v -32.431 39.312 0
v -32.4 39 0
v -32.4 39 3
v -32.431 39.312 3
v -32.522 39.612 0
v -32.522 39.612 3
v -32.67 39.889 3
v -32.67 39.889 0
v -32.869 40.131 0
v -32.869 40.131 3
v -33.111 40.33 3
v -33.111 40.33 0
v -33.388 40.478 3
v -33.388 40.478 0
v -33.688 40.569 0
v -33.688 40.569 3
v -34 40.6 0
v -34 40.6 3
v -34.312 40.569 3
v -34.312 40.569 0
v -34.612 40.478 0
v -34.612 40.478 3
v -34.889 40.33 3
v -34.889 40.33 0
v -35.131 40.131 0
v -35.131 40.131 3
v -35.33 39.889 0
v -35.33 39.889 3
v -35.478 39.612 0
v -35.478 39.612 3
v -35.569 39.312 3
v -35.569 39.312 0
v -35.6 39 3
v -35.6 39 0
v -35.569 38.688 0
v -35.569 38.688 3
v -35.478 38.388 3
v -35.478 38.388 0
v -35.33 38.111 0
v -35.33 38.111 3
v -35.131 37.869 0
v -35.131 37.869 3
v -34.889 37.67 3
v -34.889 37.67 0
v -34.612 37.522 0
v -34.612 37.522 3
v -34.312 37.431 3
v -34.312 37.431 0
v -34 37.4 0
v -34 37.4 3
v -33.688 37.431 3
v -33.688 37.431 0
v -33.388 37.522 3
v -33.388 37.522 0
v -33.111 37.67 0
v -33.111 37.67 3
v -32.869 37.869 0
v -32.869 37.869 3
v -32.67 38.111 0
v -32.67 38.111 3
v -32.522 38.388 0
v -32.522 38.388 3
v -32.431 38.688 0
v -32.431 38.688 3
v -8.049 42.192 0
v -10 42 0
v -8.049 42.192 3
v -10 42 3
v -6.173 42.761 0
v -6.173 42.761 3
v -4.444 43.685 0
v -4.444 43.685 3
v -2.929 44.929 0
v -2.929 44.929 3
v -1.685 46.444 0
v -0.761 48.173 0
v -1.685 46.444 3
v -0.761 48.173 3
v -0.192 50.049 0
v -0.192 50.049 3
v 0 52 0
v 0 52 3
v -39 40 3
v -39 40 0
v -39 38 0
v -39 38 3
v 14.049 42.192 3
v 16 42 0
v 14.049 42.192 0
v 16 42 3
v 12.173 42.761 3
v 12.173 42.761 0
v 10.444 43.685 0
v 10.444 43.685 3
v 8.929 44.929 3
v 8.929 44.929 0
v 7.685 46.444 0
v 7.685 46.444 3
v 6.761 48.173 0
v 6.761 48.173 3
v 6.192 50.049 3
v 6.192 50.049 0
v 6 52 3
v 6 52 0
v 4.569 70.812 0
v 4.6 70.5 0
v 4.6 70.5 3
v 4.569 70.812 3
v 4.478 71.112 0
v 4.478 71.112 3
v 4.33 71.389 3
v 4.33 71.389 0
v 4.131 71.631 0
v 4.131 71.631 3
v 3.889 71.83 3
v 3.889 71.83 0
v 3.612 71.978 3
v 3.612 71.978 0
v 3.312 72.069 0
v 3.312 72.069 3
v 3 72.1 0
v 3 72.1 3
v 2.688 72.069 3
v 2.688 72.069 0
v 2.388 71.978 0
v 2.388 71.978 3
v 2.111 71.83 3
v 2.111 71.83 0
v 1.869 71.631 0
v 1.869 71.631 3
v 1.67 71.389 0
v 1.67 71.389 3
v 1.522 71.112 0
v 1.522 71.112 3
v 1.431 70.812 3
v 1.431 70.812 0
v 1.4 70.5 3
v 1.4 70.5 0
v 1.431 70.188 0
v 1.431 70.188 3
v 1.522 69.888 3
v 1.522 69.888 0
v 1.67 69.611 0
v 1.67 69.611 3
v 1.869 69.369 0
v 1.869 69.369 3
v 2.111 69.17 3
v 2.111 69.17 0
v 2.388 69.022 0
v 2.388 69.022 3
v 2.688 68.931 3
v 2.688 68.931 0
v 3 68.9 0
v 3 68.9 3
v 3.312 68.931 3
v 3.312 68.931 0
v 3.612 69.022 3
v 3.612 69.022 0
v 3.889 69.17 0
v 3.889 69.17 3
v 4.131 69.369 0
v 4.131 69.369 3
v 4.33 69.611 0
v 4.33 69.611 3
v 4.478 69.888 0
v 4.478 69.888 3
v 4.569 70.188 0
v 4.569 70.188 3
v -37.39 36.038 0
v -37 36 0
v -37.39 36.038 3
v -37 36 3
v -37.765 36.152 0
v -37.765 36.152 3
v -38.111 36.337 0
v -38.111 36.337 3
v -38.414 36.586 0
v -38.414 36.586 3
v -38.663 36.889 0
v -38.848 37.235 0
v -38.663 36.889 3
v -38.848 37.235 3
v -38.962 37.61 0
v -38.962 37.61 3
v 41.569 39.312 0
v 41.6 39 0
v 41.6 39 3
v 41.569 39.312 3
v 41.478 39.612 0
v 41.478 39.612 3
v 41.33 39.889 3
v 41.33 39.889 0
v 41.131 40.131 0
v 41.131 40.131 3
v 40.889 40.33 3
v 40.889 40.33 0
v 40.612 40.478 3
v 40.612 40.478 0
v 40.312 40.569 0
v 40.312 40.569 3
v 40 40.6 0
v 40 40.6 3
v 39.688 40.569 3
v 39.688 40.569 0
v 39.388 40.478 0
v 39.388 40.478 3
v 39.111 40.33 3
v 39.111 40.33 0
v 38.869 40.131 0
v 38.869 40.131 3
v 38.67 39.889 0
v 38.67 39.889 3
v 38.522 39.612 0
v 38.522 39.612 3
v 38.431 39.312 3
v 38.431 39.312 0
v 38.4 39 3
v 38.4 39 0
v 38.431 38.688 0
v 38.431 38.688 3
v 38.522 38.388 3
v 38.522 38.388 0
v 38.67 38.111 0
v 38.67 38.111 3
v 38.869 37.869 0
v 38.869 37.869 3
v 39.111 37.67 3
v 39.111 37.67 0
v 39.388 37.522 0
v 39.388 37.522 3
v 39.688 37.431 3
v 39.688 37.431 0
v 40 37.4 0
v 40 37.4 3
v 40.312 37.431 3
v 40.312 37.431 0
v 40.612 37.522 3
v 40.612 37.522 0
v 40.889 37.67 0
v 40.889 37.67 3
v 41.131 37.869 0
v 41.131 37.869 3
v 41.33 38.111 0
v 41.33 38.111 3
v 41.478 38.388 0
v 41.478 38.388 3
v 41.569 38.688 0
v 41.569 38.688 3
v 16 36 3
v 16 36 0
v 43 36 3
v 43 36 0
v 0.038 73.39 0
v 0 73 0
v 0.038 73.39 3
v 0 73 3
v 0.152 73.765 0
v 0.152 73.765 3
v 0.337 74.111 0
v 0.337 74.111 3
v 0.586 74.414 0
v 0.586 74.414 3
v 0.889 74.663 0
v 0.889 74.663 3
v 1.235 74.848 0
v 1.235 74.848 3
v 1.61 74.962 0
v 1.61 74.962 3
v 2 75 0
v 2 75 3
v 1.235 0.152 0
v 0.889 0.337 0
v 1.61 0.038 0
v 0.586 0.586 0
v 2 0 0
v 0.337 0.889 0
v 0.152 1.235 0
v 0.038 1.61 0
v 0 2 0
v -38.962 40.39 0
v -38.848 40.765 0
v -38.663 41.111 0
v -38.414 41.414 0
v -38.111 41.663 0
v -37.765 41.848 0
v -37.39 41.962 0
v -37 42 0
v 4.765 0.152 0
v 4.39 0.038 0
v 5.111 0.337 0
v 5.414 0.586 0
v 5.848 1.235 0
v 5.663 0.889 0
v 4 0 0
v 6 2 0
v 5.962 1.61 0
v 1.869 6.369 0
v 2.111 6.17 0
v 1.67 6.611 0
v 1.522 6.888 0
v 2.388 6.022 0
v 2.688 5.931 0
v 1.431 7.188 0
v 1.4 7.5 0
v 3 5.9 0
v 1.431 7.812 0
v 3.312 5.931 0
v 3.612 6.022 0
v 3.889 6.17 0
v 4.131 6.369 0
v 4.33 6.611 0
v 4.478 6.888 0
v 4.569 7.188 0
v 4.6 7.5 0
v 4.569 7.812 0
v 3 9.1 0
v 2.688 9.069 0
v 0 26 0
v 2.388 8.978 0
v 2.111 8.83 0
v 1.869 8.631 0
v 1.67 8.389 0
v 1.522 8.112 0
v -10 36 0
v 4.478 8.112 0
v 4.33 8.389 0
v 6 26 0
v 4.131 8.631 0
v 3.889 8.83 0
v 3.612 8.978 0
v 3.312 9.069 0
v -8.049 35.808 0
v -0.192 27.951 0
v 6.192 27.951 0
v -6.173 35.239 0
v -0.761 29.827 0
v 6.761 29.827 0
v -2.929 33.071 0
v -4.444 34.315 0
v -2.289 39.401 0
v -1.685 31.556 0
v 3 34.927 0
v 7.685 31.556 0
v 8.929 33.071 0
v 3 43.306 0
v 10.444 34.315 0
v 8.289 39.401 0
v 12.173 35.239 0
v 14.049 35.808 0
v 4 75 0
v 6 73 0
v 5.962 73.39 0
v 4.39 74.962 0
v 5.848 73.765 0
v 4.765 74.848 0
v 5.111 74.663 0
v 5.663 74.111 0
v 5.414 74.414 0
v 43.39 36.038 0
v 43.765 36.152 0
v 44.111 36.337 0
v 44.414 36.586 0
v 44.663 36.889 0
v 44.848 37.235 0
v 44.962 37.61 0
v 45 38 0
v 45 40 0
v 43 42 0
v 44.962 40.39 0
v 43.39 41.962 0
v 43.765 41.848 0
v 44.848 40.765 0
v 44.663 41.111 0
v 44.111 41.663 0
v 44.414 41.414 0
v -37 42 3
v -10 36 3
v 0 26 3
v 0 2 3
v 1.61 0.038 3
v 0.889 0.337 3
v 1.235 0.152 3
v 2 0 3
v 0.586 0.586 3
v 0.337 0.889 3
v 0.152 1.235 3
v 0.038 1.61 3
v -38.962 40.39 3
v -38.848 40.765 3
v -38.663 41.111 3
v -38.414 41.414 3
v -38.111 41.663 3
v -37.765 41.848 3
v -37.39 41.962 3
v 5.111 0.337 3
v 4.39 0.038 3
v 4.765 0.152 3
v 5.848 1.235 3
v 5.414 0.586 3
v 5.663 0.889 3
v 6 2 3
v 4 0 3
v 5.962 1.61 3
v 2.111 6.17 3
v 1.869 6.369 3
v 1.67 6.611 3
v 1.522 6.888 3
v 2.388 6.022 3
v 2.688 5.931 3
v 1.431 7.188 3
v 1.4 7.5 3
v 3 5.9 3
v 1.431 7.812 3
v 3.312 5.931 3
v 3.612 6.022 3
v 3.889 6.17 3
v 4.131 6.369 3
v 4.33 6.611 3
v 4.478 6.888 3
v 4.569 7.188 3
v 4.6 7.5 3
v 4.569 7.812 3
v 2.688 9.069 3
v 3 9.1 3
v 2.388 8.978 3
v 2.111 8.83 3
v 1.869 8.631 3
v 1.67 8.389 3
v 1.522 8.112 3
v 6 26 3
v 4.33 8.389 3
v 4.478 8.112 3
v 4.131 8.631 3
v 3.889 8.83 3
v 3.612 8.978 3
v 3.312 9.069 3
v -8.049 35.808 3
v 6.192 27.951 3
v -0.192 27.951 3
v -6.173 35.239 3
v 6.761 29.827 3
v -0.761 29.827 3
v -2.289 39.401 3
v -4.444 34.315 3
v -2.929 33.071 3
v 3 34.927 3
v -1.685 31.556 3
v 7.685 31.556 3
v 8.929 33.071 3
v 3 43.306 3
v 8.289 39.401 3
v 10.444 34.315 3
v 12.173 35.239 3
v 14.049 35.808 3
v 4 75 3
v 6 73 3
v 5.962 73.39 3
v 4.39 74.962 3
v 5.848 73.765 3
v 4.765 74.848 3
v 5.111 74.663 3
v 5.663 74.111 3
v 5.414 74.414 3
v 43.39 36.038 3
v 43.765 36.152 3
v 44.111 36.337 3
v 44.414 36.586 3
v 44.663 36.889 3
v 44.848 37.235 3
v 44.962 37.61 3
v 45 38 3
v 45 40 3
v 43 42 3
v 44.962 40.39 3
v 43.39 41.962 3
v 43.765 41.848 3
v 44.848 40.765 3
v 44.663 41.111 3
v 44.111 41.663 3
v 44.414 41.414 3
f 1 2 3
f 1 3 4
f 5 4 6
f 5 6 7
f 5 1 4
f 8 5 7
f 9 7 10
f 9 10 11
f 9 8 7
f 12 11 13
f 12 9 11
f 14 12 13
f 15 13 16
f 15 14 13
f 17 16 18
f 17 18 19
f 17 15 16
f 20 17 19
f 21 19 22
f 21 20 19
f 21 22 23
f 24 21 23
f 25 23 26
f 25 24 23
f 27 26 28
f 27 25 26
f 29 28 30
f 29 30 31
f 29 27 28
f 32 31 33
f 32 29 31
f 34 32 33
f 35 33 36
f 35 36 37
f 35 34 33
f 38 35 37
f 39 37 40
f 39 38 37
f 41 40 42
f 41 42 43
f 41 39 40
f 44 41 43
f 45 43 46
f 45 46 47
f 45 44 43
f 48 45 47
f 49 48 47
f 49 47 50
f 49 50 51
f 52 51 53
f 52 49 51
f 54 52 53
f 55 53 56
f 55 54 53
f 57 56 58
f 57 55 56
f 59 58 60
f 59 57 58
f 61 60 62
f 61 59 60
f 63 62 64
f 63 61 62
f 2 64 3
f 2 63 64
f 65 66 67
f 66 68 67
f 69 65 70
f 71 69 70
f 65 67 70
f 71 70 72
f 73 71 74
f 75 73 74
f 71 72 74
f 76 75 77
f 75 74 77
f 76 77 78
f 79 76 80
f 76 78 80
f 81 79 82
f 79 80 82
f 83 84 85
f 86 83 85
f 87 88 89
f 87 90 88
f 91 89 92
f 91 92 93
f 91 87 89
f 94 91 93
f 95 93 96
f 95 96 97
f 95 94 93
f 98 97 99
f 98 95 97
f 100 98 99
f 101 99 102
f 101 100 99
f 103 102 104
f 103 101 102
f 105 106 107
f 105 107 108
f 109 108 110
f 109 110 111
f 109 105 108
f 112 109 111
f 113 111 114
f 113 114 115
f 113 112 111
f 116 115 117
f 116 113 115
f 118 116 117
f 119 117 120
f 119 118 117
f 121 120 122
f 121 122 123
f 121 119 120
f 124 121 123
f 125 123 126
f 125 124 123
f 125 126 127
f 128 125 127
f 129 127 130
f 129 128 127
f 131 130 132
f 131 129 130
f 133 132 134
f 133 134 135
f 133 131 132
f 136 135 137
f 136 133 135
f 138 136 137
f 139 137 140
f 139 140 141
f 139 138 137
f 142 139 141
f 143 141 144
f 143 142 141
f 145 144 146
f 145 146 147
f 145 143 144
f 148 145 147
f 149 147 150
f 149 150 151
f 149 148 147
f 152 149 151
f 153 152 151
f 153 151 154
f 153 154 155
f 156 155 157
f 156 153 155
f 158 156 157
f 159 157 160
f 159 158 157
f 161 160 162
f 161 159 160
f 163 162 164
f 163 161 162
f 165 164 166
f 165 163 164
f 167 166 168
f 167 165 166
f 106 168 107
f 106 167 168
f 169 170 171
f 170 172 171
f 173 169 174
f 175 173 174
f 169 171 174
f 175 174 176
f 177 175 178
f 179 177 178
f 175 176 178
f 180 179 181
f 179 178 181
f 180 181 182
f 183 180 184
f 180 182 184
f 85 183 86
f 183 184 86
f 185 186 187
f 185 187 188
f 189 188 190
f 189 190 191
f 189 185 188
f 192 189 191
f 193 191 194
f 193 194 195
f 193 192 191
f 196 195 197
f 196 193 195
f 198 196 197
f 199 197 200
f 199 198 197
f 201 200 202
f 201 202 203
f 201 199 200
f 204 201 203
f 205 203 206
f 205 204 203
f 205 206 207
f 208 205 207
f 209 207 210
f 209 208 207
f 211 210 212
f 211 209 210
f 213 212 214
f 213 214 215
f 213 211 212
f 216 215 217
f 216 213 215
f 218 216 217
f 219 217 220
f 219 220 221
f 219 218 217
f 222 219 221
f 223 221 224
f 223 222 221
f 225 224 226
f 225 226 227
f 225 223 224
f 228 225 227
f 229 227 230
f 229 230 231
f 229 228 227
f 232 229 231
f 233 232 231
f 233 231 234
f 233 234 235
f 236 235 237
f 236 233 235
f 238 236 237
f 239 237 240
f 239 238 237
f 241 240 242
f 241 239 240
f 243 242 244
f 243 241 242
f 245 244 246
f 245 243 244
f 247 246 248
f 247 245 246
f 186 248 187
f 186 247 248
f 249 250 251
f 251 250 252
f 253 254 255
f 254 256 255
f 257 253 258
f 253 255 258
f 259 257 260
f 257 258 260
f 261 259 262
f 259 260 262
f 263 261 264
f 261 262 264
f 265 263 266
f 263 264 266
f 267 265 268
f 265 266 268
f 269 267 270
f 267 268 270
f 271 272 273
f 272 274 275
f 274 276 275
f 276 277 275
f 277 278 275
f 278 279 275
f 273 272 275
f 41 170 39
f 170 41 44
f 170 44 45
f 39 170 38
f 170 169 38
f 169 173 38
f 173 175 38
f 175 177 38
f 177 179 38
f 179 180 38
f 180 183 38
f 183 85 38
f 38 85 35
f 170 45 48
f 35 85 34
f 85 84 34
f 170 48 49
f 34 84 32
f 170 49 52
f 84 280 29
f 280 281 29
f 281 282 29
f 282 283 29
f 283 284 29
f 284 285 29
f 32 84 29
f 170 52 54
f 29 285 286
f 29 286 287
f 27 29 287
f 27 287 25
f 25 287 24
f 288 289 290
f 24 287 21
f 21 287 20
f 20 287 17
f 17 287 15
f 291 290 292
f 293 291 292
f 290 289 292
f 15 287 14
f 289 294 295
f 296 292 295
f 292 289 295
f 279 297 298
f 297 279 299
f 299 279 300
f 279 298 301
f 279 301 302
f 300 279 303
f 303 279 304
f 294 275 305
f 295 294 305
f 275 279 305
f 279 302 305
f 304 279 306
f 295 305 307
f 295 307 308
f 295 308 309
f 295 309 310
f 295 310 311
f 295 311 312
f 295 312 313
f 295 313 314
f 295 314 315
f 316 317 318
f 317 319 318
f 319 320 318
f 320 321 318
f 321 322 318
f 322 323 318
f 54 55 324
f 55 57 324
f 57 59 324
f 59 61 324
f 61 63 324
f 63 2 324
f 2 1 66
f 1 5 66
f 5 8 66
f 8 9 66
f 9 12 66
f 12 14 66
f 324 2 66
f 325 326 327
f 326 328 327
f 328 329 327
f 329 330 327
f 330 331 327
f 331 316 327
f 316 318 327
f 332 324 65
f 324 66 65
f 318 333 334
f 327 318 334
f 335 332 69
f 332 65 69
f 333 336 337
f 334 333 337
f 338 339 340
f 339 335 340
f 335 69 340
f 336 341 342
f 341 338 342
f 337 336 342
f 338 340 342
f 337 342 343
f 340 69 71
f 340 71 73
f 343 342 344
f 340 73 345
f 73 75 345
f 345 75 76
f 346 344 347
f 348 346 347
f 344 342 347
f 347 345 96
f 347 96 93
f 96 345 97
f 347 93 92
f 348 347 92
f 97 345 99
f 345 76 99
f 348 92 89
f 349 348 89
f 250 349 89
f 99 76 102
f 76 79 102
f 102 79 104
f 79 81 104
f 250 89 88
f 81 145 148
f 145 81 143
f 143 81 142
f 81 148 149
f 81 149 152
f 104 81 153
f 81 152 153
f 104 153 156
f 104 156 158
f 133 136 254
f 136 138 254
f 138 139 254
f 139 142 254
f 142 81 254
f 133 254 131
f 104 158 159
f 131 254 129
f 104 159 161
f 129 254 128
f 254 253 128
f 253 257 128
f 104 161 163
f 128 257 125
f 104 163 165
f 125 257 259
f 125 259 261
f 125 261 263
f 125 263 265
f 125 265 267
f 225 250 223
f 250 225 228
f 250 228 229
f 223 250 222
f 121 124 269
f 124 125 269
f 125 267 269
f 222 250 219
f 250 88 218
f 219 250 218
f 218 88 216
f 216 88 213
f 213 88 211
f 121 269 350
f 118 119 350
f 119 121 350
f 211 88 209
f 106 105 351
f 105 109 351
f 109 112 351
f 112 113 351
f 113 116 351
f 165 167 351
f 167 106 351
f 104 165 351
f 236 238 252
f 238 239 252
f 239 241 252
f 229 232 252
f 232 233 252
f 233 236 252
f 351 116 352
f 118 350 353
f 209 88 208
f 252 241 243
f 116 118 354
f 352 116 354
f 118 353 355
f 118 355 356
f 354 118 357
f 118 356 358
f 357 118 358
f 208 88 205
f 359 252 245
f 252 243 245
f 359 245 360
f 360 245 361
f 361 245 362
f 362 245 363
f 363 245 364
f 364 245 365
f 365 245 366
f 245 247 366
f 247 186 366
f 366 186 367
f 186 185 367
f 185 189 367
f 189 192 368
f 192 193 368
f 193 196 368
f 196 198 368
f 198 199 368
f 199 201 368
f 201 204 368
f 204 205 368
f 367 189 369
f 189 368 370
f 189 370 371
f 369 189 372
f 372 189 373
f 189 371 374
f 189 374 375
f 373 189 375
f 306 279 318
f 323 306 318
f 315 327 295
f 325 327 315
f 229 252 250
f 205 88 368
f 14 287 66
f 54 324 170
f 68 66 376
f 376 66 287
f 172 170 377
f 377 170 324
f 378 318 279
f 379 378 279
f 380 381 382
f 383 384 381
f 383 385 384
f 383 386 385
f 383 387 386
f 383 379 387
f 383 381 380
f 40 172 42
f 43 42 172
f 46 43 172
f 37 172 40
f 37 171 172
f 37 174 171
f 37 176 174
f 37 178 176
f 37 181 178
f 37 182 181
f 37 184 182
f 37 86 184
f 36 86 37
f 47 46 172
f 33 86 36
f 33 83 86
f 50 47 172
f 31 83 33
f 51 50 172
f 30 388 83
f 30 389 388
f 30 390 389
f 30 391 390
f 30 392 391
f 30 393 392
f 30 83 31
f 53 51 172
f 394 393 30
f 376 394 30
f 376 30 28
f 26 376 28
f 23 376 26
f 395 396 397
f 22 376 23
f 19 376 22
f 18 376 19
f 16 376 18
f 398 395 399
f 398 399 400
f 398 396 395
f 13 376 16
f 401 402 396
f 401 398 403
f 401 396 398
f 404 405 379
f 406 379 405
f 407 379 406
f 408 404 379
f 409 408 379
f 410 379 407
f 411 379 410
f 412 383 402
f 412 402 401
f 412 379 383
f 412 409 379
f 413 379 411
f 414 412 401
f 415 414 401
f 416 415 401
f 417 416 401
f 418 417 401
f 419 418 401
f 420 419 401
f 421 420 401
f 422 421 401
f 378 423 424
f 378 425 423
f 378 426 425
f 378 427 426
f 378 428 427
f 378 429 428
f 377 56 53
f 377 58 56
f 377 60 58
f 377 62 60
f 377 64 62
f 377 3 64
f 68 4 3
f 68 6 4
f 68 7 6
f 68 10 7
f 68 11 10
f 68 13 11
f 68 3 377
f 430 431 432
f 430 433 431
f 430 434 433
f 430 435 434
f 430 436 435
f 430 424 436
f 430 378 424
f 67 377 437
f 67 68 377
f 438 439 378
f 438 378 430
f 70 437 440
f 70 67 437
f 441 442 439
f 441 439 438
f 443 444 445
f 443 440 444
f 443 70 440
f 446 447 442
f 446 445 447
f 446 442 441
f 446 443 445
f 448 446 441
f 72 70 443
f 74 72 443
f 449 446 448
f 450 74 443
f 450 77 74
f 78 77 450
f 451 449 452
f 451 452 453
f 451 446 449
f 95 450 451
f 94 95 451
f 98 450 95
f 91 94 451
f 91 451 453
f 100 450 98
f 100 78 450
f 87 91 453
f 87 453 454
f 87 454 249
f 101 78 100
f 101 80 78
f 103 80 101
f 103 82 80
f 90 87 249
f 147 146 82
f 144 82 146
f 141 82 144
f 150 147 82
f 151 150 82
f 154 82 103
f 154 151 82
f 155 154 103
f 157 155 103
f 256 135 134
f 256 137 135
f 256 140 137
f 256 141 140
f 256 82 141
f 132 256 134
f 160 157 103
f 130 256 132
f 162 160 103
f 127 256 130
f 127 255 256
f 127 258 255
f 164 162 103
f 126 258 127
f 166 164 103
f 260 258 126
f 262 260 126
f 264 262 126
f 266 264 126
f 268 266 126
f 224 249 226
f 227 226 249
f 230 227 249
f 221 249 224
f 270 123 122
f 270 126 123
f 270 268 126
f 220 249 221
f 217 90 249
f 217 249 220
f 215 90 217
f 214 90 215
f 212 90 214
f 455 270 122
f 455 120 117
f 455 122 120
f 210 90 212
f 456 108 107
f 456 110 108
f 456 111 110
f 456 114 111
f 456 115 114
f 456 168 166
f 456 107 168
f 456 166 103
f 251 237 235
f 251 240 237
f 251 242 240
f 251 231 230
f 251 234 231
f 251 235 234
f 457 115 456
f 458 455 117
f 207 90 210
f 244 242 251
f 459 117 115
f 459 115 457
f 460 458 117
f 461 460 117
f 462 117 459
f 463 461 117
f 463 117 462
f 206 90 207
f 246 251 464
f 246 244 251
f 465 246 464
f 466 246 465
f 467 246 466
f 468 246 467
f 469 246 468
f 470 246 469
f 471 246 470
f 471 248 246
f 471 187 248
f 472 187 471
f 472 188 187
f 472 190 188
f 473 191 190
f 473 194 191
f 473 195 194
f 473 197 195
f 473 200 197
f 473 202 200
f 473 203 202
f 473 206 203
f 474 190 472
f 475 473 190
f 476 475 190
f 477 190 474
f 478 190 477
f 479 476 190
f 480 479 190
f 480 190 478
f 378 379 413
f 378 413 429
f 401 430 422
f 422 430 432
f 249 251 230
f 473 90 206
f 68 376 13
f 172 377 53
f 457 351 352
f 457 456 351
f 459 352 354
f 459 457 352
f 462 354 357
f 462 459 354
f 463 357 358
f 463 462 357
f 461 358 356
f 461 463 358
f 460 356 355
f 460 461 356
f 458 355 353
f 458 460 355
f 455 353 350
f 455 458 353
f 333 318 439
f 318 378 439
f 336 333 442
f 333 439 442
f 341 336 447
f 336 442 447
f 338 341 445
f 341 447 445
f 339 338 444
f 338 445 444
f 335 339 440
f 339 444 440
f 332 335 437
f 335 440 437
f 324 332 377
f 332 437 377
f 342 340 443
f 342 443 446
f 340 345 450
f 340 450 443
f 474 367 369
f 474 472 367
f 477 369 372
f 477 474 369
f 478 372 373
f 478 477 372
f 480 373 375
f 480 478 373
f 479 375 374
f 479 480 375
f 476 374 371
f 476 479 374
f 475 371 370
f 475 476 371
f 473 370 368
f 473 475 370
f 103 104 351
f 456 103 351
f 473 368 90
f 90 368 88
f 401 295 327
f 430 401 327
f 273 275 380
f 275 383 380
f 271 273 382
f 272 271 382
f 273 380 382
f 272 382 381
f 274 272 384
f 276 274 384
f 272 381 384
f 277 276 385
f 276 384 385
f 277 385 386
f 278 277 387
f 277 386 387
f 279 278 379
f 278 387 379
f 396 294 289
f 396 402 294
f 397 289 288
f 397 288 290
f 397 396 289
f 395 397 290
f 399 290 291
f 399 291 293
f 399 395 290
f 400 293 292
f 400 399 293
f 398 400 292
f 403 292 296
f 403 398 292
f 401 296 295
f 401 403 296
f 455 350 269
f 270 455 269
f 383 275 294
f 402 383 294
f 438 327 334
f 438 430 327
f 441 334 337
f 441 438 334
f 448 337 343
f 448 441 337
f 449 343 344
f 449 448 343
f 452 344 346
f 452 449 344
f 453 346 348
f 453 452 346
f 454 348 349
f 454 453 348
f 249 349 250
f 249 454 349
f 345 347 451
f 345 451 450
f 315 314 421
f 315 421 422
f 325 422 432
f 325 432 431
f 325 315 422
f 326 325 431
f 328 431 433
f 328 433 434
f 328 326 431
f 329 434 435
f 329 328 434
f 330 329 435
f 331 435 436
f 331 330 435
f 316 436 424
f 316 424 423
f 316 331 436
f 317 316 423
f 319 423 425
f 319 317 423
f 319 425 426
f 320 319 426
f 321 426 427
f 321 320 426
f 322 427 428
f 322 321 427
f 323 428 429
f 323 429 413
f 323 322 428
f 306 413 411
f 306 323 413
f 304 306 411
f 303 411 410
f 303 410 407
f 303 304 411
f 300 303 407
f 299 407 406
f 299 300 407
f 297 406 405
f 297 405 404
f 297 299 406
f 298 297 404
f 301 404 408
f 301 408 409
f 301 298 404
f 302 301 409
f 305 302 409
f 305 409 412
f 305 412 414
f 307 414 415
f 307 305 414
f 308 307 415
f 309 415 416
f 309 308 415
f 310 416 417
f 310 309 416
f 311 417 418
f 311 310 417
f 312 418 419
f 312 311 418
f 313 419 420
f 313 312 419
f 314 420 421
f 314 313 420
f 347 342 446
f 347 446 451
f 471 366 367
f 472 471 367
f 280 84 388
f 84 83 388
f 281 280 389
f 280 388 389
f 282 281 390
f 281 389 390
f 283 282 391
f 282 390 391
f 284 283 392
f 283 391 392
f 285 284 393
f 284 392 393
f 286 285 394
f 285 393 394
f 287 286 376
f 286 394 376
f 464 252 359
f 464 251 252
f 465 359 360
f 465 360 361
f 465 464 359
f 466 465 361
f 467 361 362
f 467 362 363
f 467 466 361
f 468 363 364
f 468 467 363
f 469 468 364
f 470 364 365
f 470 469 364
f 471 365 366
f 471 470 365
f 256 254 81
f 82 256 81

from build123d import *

# Parameters (mm, degrees)
SKETCH_1_R      = 1.6
EXTRUDE_1_DEPTH = 3
FILLET_1_R      = 2
FILLET_2_R      = 10


with BuildPart() as part:
    # 草图1 → 凸台-拉伸1 (new body)
    with BuildSketch(Plane.XY):
        Polygon((0, 0), (6, 0), (6, 36), (45, 36), (45, 42), (6, 42), (6, 75), (0, 75), (0, 42), (-39, 42), (-39, 36), (0, 36), align=None)
        with Locations((40, 39)):
            Circle(SKETCH_1_R, mode=Mode.SUBTRACT)
        with Locations((-34, 39)):
            Circle(SKETCH_1_R, mode=Mode.SUBTRACT)
        with Locations((3, 7.5)):
            Circle(SKETCH_1_R, mode=Mode.SUBTRACT)
        with Locations((3, 70.5)):
            Circle(SKETCH_1_R, mode=Mode.SUBTRACT)
        Polygon((3, 43.306086205), (-2.288898942, 39.401411526), (3, 34.92685231), (8.288898942, 39.401411526), align=None, mode=Mode.SUBTRACT)
    extrude(amount=EXTRUDE_1_DEPTH)

    # 圆角1
    fillet_1_edges = [part.edges().sort_by_distance(p)[0] for p in [
        (-39, 36, 1.5),
        (-39, 42, 1.5),
        (0, 75, 1.5),
        (6, 75, 1.5),
        (45, 42, 1.5),
        (45, 36, 1.5),
        (6, 0, 1.5),
        (0, 0, 1.5),
    ]]
    fillet(fillet_1_edges, radius=FILLET_1_R)

    # 圆角2
    fillet_2_edges = [part.edges().sort_by_distance(p)[0] for p in [
        (0, 36, 1.5),
        (0, 42, 1.5),
        (6, 42, 1.5),
        (6, 36, 1.5),
    ]]
    fillet(fillet_2_edges, radius=FILLET_2_R)


solid = part.part
